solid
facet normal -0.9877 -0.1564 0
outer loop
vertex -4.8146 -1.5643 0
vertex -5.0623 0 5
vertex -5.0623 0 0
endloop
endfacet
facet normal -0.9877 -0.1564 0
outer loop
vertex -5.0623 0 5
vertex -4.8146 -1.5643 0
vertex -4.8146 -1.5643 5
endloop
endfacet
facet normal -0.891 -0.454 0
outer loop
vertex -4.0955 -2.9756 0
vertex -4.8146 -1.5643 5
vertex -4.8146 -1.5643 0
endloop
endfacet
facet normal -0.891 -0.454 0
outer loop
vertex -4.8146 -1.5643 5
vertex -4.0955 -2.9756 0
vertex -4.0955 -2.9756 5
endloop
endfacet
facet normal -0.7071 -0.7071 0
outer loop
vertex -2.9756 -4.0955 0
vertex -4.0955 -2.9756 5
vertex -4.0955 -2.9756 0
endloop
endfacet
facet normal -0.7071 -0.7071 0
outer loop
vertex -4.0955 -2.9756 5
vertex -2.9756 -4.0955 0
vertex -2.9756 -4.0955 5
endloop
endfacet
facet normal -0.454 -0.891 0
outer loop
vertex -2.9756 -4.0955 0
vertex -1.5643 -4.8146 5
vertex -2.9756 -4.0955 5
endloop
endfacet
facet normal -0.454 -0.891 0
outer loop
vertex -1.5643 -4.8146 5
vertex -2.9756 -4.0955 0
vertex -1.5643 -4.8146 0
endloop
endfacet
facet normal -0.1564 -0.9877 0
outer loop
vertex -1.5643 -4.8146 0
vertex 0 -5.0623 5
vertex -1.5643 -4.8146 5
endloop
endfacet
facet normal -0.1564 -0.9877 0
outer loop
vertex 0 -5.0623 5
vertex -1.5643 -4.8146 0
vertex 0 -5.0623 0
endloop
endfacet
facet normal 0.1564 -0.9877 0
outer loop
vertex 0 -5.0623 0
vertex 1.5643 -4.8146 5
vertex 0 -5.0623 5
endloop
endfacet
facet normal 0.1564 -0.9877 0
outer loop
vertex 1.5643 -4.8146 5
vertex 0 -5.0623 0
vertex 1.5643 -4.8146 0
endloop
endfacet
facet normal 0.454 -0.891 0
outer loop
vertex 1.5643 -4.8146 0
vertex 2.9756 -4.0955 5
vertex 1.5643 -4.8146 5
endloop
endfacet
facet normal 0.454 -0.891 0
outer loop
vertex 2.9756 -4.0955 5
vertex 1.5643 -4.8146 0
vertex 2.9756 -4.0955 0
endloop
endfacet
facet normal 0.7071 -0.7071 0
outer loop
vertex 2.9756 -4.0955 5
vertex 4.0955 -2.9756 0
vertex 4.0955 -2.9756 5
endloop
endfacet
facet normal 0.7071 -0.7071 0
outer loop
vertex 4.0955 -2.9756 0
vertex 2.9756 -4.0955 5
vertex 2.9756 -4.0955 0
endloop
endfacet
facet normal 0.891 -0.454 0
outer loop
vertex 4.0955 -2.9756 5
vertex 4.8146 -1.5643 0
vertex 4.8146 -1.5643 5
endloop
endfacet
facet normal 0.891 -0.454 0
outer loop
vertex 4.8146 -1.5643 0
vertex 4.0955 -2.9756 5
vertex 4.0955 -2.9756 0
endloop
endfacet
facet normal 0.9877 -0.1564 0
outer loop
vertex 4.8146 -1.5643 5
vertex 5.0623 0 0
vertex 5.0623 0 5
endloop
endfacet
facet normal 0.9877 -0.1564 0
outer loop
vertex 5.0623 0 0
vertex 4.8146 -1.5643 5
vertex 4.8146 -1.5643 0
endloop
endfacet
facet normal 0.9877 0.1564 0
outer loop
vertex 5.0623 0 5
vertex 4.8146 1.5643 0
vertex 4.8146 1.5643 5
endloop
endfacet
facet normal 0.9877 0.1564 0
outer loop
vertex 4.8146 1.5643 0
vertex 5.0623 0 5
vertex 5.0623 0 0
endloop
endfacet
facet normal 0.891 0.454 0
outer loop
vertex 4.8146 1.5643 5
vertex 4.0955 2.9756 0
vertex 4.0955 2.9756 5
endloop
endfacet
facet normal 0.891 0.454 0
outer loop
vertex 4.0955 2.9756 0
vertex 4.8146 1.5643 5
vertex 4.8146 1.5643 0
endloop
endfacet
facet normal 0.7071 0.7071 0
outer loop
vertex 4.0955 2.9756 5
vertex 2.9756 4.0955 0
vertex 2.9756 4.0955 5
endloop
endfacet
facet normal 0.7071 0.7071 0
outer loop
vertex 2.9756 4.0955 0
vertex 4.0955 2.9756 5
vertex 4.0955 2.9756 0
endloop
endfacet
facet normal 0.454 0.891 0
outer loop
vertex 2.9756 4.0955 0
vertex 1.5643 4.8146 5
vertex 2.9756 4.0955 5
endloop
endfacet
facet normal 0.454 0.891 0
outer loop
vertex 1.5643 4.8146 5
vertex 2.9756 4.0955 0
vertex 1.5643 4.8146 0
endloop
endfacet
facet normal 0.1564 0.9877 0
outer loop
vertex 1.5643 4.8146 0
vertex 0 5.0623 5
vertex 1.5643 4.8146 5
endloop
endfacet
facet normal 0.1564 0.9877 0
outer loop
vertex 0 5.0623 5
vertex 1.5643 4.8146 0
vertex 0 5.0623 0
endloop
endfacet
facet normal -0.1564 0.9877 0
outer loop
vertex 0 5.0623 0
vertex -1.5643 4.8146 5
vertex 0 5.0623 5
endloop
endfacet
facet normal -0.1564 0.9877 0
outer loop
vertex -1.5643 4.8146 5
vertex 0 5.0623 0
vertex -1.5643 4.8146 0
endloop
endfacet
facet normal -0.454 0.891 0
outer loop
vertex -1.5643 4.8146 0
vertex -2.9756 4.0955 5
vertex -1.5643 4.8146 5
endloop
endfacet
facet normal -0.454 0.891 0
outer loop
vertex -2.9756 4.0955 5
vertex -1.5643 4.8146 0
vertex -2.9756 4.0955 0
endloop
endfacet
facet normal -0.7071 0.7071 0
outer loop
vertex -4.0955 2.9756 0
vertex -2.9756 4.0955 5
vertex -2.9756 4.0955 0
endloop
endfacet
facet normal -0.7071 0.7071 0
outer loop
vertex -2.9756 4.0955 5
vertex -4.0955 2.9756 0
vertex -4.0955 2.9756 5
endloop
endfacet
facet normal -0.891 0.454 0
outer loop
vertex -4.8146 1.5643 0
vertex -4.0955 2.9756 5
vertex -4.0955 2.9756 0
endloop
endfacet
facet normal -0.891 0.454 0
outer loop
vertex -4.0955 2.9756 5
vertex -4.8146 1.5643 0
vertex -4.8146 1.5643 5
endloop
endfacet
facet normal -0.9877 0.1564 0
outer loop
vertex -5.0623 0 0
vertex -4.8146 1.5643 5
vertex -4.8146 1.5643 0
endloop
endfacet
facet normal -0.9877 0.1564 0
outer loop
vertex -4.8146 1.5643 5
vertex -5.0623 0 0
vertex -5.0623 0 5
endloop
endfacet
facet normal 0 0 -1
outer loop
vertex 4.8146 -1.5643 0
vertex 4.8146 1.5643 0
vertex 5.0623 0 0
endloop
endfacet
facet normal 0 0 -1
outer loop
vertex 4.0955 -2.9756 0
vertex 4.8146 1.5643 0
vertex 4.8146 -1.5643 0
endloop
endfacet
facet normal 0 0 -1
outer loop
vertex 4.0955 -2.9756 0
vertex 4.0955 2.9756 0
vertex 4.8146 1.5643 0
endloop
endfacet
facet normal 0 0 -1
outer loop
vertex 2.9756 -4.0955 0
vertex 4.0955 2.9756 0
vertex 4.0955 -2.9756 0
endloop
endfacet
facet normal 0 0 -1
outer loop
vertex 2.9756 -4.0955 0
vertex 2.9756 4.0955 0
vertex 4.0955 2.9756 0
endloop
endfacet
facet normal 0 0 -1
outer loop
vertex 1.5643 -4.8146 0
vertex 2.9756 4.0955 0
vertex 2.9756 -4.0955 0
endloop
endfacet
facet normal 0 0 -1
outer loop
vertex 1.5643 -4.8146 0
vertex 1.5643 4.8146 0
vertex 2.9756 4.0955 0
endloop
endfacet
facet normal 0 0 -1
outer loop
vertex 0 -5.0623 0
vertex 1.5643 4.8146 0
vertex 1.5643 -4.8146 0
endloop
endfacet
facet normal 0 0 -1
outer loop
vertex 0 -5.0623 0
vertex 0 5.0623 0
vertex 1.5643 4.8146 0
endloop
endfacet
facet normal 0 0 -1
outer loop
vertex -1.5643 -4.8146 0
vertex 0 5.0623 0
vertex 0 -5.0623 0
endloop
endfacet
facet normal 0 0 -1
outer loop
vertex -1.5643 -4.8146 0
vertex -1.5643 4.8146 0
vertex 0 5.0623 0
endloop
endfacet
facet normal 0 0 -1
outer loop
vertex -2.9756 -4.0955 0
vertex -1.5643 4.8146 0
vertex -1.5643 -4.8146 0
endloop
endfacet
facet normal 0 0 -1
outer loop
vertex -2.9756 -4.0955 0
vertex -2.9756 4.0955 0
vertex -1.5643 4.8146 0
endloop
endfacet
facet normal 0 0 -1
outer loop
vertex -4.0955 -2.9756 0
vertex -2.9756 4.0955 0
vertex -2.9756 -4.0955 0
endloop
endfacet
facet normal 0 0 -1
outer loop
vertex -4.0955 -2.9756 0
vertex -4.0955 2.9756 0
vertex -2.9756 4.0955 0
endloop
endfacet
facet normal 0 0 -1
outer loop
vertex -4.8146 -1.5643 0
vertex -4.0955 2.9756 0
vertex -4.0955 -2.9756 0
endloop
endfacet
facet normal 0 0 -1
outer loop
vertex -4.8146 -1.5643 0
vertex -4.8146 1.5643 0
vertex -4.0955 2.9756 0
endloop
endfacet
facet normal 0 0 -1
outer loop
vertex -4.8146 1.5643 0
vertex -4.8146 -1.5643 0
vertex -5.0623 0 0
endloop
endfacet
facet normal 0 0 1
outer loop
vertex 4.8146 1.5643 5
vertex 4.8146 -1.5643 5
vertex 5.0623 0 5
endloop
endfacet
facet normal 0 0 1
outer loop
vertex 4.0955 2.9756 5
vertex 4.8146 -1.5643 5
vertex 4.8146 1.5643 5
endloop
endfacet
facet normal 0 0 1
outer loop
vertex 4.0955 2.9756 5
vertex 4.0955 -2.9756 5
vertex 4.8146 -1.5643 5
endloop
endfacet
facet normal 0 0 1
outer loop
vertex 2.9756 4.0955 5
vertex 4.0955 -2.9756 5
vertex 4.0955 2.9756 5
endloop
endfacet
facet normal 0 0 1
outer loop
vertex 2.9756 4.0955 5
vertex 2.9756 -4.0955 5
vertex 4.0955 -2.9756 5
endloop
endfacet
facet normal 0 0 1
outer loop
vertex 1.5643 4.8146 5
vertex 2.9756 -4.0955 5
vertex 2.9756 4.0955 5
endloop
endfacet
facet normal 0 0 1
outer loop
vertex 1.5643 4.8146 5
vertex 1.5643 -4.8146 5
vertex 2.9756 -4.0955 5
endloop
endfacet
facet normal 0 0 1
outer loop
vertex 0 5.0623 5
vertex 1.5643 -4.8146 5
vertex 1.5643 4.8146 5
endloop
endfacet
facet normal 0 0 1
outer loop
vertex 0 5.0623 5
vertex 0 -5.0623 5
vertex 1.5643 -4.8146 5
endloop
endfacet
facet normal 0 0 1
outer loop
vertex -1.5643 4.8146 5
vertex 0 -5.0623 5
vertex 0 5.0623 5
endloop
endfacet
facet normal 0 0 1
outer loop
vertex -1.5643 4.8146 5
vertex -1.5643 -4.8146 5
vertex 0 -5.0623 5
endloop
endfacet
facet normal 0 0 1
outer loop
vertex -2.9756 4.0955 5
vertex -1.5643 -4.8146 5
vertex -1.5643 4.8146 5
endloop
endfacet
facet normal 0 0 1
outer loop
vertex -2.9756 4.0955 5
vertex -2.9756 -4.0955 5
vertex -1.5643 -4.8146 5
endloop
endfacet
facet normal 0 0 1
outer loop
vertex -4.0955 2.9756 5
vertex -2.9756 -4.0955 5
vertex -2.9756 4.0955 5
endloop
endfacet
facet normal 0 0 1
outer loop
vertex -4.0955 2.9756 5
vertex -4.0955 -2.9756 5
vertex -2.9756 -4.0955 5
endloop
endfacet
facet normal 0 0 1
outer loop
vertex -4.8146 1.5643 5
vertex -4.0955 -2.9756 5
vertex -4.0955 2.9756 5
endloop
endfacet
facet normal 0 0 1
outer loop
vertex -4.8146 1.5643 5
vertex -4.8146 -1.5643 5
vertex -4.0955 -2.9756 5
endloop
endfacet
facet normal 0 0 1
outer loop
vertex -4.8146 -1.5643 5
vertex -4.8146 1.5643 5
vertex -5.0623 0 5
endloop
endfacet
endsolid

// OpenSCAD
// Based on nophead research
module polyhole(d, h, center=false) {
    n = max(round(2 * d),3);
    rotate([0,0,180])
        cylinder(h = h, r = (d / 2) / cos (180 / n), $fn = n, center = center);
}

// make it interchangeable between this and cylinder
module cylinder_poly(r, h, center=false){
    polyhole(d=r*2, h=h, center=center);
}

cylinder_poly(5,5);
